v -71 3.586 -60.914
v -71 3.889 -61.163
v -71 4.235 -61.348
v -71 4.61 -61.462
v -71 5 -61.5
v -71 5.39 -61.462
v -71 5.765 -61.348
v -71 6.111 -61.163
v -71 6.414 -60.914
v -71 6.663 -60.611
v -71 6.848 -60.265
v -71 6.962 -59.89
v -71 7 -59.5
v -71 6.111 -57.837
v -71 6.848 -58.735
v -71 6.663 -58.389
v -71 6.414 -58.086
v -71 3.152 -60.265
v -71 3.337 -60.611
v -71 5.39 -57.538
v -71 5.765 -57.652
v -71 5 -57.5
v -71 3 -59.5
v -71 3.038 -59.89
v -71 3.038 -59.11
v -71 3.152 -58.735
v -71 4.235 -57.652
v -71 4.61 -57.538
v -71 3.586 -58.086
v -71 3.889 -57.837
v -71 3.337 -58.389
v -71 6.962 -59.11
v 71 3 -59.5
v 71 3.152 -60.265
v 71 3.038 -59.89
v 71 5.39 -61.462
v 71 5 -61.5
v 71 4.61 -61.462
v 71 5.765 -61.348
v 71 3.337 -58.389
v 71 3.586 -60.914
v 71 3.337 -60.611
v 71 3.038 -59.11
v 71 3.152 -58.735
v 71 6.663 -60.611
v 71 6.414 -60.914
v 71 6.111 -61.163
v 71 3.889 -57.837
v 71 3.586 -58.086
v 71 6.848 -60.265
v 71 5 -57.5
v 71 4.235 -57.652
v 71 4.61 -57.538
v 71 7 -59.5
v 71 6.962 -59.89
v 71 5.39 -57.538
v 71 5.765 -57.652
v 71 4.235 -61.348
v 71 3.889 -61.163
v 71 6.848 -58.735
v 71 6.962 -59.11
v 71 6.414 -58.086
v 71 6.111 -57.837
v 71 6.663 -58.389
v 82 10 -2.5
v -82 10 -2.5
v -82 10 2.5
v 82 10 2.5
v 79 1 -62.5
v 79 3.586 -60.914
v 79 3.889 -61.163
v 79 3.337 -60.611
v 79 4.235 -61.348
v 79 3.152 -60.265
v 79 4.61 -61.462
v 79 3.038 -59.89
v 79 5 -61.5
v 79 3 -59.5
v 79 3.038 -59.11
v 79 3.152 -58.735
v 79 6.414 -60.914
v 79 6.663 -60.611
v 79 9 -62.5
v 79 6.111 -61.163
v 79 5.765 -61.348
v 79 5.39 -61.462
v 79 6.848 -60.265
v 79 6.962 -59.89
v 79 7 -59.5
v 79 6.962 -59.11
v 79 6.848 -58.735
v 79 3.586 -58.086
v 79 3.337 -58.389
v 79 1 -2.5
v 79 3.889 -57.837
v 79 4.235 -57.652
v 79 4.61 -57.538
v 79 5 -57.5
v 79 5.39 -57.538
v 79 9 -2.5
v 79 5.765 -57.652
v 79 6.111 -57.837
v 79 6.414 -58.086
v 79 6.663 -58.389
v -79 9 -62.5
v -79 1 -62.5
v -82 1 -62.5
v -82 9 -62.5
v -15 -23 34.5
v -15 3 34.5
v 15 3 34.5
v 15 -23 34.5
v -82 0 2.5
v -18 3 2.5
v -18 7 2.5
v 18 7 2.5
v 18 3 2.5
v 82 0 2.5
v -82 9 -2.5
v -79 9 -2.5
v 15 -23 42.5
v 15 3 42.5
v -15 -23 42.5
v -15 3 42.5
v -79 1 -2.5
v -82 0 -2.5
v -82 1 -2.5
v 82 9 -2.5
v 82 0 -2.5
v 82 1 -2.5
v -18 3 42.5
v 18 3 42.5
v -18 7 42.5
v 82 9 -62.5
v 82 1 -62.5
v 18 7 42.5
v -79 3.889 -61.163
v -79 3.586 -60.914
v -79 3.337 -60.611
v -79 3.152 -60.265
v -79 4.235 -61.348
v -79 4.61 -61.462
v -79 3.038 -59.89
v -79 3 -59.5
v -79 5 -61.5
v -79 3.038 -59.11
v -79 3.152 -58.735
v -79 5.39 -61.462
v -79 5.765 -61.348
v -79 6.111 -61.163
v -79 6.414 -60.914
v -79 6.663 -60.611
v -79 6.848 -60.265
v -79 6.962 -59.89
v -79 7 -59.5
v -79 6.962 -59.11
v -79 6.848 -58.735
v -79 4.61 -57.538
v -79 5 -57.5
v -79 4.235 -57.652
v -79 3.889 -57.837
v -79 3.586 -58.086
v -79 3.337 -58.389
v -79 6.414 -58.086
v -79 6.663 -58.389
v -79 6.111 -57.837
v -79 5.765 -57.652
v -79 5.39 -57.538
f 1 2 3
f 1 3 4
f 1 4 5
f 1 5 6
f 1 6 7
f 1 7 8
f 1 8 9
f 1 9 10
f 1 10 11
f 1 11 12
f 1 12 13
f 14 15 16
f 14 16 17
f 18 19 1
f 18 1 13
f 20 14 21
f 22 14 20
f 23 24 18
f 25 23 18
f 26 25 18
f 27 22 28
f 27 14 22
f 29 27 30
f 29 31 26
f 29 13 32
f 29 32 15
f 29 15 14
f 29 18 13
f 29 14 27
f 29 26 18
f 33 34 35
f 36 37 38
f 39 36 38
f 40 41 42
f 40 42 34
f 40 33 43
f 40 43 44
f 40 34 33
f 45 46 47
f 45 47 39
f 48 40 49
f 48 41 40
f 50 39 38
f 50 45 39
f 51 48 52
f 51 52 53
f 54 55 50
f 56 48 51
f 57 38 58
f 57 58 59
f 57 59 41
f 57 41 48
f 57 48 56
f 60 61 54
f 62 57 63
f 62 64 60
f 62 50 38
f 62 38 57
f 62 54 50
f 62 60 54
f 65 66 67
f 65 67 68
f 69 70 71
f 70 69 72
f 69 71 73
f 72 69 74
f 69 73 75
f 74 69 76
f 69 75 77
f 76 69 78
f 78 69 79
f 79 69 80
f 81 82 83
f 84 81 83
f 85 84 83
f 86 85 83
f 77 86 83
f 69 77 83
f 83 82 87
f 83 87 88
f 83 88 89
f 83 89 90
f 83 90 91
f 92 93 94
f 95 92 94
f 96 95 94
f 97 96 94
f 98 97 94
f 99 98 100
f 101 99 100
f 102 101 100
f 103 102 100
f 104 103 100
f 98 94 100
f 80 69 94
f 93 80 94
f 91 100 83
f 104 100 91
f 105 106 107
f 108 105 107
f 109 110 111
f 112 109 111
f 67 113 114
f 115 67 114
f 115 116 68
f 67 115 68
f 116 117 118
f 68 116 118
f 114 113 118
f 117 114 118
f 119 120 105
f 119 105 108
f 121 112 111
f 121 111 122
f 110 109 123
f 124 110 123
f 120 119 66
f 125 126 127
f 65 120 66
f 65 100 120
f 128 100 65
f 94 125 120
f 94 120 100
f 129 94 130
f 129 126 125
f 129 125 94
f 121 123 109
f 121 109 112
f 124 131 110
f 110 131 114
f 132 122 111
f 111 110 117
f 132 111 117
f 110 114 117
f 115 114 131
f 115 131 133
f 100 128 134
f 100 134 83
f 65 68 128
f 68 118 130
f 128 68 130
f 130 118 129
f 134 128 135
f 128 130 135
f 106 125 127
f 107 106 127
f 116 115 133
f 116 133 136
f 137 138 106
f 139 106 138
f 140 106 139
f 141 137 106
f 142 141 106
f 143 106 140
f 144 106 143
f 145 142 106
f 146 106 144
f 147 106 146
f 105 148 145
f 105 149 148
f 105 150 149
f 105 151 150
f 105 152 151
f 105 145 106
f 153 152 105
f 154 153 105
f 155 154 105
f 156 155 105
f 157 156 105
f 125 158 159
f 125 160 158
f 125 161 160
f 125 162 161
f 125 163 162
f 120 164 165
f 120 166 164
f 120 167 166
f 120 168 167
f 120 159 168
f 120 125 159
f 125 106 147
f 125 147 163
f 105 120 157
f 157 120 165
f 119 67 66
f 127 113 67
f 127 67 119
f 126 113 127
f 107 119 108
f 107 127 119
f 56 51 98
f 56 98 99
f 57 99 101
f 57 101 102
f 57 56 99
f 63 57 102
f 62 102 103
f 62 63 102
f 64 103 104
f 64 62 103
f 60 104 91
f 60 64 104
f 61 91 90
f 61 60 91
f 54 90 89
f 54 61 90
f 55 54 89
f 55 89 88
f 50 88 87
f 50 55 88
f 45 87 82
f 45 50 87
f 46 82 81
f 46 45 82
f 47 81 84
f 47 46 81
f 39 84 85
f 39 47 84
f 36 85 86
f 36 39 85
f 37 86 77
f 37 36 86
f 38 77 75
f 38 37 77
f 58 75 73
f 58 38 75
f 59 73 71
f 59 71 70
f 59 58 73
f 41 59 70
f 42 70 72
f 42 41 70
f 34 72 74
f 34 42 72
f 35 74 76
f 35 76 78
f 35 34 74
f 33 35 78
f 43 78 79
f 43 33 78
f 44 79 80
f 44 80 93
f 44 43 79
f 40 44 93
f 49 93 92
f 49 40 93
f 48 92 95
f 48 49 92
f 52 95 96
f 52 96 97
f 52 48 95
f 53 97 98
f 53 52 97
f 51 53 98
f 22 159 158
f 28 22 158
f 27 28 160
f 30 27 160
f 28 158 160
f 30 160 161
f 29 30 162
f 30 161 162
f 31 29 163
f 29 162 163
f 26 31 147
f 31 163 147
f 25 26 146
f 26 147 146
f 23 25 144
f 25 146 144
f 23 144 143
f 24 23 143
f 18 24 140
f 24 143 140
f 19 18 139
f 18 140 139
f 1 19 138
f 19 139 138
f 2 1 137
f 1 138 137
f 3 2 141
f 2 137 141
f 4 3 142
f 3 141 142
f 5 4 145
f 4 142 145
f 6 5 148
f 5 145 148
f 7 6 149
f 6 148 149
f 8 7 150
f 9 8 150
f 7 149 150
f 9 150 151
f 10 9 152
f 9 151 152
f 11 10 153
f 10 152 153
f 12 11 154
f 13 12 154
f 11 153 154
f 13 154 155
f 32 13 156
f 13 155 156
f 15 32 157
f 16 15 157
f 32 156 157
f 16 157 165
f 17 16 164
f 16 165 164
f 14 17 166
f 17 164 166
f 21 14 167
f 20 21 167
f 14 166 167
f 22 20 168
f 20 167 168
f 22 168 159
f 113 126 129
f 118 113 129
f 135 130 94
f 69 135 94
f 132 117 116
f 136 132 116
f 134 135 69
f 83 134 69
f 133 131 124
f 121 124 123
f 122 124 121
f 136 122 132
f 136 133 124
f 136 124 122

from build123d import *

# Parameters (mm, degrees)
SKETCH_1_W             = 164
SKETCH_1_H             = 5
EXTRUDE_1_DEPTH        = 10
SKETCH_2_W             = 3
SKETCH_2_H             = 8
EXTRUDE_2_DEPTH        = 60
PATTERN_LINEAR_1_COUNT = 2
PATTERN_LINEAR_1_PITCH = 161
SKETCH_4_R             = 2
EXTRUDE_3_DEPTH        = 8
EXTRUDE_START          = 8
SKETCH_5_R             = 2
EXTRUDE_4_DEPTH        = 8
SKETCH_6_W             = 36
SKETCH_6_H             = 4
EXTRUDE_5_DEPTH        = 40
SKETCH_7_W             = 30
SKETCH_7_H             = 8
EXTRUDE_6_DEPTH        = 26


with BuildPart() as part:
    # 草图1 → 凸台-拉伸1 (new body)
    with BuildSketch(Plane(origin=(0, 0, 0), x_dir=(1, 0, 0), z_dir=(0, 1, 0))):
        Rectangle(SKETCH_1_W, SKETCH_1_H)
    extrude(amount=EXTRUDE_1_DEPTH)

    # 草图2 → 凸台-拉伸2 (add)
    with BuildSketch(Plane(origin=(0, 0, -2.5), x_dir=(-1, 0, 0), z_dir=(0, 0, -1))):
        with Locations((-80.5, 5)):
            Rectangle(SKETCH_2_W, SKETCH_2_H)
    extrude_2 = extrude(amount=EXTRUDE_2_DEPTH)

    # 阵列(线性)1: 凸台-拉伸2 ×2
    with Locations(*[(-i * PATTERN_LINEAR_1_PITCH, 0, 0) for i in range(1, PATTERN_LINEAR_1_COUNT)]):
        add(extrude_2)

    # 草图4 → 凸台-拉伸3 (add)
    with BuildSketch(Plane(origin=(-79, 0, 0), x_dir=(0, 0, -1), z_dir=(1, 0, 0))):
        with Locations(Location((59.5, 5, 0), (0, 0, 180))):
            Circle(SKETCH_4_R)
    extrude(amount=EXTRUDE_3_DEPTH)

    # 草图5 → 凸台-拉伸4 (add)
    with BuildSketch(Plane.ZY.offset(-79).offset(EXTRUDE_START)):
        with Locations((-59.5, 5)):
            Circle(SKETCH_5_R)
    extrude(amount=-EXTRUDE_4_DEPTH)

    # 草图6 → 凸台-拉伸5 (add)
    with BuildSketch(Plane.XY.offset(2.5)):
        with Locations((0, 5)):
            Rectangle(SKETCH_6_W, SKETCH_6_H)
    extrude(amount=EXTRUDE_5_DEPTH)

    # 草图7 → 凸台-拉伸6 (add)
    with BuildSketch(Plane.XZ.offset(-3)):
        with Locations((0, 38.5)):
            Rectangle(SKETCH_7_W, SKETCH_7_H)
    extrude(amount=EXTRUDE_6_DEPTH)


solid = part.part
